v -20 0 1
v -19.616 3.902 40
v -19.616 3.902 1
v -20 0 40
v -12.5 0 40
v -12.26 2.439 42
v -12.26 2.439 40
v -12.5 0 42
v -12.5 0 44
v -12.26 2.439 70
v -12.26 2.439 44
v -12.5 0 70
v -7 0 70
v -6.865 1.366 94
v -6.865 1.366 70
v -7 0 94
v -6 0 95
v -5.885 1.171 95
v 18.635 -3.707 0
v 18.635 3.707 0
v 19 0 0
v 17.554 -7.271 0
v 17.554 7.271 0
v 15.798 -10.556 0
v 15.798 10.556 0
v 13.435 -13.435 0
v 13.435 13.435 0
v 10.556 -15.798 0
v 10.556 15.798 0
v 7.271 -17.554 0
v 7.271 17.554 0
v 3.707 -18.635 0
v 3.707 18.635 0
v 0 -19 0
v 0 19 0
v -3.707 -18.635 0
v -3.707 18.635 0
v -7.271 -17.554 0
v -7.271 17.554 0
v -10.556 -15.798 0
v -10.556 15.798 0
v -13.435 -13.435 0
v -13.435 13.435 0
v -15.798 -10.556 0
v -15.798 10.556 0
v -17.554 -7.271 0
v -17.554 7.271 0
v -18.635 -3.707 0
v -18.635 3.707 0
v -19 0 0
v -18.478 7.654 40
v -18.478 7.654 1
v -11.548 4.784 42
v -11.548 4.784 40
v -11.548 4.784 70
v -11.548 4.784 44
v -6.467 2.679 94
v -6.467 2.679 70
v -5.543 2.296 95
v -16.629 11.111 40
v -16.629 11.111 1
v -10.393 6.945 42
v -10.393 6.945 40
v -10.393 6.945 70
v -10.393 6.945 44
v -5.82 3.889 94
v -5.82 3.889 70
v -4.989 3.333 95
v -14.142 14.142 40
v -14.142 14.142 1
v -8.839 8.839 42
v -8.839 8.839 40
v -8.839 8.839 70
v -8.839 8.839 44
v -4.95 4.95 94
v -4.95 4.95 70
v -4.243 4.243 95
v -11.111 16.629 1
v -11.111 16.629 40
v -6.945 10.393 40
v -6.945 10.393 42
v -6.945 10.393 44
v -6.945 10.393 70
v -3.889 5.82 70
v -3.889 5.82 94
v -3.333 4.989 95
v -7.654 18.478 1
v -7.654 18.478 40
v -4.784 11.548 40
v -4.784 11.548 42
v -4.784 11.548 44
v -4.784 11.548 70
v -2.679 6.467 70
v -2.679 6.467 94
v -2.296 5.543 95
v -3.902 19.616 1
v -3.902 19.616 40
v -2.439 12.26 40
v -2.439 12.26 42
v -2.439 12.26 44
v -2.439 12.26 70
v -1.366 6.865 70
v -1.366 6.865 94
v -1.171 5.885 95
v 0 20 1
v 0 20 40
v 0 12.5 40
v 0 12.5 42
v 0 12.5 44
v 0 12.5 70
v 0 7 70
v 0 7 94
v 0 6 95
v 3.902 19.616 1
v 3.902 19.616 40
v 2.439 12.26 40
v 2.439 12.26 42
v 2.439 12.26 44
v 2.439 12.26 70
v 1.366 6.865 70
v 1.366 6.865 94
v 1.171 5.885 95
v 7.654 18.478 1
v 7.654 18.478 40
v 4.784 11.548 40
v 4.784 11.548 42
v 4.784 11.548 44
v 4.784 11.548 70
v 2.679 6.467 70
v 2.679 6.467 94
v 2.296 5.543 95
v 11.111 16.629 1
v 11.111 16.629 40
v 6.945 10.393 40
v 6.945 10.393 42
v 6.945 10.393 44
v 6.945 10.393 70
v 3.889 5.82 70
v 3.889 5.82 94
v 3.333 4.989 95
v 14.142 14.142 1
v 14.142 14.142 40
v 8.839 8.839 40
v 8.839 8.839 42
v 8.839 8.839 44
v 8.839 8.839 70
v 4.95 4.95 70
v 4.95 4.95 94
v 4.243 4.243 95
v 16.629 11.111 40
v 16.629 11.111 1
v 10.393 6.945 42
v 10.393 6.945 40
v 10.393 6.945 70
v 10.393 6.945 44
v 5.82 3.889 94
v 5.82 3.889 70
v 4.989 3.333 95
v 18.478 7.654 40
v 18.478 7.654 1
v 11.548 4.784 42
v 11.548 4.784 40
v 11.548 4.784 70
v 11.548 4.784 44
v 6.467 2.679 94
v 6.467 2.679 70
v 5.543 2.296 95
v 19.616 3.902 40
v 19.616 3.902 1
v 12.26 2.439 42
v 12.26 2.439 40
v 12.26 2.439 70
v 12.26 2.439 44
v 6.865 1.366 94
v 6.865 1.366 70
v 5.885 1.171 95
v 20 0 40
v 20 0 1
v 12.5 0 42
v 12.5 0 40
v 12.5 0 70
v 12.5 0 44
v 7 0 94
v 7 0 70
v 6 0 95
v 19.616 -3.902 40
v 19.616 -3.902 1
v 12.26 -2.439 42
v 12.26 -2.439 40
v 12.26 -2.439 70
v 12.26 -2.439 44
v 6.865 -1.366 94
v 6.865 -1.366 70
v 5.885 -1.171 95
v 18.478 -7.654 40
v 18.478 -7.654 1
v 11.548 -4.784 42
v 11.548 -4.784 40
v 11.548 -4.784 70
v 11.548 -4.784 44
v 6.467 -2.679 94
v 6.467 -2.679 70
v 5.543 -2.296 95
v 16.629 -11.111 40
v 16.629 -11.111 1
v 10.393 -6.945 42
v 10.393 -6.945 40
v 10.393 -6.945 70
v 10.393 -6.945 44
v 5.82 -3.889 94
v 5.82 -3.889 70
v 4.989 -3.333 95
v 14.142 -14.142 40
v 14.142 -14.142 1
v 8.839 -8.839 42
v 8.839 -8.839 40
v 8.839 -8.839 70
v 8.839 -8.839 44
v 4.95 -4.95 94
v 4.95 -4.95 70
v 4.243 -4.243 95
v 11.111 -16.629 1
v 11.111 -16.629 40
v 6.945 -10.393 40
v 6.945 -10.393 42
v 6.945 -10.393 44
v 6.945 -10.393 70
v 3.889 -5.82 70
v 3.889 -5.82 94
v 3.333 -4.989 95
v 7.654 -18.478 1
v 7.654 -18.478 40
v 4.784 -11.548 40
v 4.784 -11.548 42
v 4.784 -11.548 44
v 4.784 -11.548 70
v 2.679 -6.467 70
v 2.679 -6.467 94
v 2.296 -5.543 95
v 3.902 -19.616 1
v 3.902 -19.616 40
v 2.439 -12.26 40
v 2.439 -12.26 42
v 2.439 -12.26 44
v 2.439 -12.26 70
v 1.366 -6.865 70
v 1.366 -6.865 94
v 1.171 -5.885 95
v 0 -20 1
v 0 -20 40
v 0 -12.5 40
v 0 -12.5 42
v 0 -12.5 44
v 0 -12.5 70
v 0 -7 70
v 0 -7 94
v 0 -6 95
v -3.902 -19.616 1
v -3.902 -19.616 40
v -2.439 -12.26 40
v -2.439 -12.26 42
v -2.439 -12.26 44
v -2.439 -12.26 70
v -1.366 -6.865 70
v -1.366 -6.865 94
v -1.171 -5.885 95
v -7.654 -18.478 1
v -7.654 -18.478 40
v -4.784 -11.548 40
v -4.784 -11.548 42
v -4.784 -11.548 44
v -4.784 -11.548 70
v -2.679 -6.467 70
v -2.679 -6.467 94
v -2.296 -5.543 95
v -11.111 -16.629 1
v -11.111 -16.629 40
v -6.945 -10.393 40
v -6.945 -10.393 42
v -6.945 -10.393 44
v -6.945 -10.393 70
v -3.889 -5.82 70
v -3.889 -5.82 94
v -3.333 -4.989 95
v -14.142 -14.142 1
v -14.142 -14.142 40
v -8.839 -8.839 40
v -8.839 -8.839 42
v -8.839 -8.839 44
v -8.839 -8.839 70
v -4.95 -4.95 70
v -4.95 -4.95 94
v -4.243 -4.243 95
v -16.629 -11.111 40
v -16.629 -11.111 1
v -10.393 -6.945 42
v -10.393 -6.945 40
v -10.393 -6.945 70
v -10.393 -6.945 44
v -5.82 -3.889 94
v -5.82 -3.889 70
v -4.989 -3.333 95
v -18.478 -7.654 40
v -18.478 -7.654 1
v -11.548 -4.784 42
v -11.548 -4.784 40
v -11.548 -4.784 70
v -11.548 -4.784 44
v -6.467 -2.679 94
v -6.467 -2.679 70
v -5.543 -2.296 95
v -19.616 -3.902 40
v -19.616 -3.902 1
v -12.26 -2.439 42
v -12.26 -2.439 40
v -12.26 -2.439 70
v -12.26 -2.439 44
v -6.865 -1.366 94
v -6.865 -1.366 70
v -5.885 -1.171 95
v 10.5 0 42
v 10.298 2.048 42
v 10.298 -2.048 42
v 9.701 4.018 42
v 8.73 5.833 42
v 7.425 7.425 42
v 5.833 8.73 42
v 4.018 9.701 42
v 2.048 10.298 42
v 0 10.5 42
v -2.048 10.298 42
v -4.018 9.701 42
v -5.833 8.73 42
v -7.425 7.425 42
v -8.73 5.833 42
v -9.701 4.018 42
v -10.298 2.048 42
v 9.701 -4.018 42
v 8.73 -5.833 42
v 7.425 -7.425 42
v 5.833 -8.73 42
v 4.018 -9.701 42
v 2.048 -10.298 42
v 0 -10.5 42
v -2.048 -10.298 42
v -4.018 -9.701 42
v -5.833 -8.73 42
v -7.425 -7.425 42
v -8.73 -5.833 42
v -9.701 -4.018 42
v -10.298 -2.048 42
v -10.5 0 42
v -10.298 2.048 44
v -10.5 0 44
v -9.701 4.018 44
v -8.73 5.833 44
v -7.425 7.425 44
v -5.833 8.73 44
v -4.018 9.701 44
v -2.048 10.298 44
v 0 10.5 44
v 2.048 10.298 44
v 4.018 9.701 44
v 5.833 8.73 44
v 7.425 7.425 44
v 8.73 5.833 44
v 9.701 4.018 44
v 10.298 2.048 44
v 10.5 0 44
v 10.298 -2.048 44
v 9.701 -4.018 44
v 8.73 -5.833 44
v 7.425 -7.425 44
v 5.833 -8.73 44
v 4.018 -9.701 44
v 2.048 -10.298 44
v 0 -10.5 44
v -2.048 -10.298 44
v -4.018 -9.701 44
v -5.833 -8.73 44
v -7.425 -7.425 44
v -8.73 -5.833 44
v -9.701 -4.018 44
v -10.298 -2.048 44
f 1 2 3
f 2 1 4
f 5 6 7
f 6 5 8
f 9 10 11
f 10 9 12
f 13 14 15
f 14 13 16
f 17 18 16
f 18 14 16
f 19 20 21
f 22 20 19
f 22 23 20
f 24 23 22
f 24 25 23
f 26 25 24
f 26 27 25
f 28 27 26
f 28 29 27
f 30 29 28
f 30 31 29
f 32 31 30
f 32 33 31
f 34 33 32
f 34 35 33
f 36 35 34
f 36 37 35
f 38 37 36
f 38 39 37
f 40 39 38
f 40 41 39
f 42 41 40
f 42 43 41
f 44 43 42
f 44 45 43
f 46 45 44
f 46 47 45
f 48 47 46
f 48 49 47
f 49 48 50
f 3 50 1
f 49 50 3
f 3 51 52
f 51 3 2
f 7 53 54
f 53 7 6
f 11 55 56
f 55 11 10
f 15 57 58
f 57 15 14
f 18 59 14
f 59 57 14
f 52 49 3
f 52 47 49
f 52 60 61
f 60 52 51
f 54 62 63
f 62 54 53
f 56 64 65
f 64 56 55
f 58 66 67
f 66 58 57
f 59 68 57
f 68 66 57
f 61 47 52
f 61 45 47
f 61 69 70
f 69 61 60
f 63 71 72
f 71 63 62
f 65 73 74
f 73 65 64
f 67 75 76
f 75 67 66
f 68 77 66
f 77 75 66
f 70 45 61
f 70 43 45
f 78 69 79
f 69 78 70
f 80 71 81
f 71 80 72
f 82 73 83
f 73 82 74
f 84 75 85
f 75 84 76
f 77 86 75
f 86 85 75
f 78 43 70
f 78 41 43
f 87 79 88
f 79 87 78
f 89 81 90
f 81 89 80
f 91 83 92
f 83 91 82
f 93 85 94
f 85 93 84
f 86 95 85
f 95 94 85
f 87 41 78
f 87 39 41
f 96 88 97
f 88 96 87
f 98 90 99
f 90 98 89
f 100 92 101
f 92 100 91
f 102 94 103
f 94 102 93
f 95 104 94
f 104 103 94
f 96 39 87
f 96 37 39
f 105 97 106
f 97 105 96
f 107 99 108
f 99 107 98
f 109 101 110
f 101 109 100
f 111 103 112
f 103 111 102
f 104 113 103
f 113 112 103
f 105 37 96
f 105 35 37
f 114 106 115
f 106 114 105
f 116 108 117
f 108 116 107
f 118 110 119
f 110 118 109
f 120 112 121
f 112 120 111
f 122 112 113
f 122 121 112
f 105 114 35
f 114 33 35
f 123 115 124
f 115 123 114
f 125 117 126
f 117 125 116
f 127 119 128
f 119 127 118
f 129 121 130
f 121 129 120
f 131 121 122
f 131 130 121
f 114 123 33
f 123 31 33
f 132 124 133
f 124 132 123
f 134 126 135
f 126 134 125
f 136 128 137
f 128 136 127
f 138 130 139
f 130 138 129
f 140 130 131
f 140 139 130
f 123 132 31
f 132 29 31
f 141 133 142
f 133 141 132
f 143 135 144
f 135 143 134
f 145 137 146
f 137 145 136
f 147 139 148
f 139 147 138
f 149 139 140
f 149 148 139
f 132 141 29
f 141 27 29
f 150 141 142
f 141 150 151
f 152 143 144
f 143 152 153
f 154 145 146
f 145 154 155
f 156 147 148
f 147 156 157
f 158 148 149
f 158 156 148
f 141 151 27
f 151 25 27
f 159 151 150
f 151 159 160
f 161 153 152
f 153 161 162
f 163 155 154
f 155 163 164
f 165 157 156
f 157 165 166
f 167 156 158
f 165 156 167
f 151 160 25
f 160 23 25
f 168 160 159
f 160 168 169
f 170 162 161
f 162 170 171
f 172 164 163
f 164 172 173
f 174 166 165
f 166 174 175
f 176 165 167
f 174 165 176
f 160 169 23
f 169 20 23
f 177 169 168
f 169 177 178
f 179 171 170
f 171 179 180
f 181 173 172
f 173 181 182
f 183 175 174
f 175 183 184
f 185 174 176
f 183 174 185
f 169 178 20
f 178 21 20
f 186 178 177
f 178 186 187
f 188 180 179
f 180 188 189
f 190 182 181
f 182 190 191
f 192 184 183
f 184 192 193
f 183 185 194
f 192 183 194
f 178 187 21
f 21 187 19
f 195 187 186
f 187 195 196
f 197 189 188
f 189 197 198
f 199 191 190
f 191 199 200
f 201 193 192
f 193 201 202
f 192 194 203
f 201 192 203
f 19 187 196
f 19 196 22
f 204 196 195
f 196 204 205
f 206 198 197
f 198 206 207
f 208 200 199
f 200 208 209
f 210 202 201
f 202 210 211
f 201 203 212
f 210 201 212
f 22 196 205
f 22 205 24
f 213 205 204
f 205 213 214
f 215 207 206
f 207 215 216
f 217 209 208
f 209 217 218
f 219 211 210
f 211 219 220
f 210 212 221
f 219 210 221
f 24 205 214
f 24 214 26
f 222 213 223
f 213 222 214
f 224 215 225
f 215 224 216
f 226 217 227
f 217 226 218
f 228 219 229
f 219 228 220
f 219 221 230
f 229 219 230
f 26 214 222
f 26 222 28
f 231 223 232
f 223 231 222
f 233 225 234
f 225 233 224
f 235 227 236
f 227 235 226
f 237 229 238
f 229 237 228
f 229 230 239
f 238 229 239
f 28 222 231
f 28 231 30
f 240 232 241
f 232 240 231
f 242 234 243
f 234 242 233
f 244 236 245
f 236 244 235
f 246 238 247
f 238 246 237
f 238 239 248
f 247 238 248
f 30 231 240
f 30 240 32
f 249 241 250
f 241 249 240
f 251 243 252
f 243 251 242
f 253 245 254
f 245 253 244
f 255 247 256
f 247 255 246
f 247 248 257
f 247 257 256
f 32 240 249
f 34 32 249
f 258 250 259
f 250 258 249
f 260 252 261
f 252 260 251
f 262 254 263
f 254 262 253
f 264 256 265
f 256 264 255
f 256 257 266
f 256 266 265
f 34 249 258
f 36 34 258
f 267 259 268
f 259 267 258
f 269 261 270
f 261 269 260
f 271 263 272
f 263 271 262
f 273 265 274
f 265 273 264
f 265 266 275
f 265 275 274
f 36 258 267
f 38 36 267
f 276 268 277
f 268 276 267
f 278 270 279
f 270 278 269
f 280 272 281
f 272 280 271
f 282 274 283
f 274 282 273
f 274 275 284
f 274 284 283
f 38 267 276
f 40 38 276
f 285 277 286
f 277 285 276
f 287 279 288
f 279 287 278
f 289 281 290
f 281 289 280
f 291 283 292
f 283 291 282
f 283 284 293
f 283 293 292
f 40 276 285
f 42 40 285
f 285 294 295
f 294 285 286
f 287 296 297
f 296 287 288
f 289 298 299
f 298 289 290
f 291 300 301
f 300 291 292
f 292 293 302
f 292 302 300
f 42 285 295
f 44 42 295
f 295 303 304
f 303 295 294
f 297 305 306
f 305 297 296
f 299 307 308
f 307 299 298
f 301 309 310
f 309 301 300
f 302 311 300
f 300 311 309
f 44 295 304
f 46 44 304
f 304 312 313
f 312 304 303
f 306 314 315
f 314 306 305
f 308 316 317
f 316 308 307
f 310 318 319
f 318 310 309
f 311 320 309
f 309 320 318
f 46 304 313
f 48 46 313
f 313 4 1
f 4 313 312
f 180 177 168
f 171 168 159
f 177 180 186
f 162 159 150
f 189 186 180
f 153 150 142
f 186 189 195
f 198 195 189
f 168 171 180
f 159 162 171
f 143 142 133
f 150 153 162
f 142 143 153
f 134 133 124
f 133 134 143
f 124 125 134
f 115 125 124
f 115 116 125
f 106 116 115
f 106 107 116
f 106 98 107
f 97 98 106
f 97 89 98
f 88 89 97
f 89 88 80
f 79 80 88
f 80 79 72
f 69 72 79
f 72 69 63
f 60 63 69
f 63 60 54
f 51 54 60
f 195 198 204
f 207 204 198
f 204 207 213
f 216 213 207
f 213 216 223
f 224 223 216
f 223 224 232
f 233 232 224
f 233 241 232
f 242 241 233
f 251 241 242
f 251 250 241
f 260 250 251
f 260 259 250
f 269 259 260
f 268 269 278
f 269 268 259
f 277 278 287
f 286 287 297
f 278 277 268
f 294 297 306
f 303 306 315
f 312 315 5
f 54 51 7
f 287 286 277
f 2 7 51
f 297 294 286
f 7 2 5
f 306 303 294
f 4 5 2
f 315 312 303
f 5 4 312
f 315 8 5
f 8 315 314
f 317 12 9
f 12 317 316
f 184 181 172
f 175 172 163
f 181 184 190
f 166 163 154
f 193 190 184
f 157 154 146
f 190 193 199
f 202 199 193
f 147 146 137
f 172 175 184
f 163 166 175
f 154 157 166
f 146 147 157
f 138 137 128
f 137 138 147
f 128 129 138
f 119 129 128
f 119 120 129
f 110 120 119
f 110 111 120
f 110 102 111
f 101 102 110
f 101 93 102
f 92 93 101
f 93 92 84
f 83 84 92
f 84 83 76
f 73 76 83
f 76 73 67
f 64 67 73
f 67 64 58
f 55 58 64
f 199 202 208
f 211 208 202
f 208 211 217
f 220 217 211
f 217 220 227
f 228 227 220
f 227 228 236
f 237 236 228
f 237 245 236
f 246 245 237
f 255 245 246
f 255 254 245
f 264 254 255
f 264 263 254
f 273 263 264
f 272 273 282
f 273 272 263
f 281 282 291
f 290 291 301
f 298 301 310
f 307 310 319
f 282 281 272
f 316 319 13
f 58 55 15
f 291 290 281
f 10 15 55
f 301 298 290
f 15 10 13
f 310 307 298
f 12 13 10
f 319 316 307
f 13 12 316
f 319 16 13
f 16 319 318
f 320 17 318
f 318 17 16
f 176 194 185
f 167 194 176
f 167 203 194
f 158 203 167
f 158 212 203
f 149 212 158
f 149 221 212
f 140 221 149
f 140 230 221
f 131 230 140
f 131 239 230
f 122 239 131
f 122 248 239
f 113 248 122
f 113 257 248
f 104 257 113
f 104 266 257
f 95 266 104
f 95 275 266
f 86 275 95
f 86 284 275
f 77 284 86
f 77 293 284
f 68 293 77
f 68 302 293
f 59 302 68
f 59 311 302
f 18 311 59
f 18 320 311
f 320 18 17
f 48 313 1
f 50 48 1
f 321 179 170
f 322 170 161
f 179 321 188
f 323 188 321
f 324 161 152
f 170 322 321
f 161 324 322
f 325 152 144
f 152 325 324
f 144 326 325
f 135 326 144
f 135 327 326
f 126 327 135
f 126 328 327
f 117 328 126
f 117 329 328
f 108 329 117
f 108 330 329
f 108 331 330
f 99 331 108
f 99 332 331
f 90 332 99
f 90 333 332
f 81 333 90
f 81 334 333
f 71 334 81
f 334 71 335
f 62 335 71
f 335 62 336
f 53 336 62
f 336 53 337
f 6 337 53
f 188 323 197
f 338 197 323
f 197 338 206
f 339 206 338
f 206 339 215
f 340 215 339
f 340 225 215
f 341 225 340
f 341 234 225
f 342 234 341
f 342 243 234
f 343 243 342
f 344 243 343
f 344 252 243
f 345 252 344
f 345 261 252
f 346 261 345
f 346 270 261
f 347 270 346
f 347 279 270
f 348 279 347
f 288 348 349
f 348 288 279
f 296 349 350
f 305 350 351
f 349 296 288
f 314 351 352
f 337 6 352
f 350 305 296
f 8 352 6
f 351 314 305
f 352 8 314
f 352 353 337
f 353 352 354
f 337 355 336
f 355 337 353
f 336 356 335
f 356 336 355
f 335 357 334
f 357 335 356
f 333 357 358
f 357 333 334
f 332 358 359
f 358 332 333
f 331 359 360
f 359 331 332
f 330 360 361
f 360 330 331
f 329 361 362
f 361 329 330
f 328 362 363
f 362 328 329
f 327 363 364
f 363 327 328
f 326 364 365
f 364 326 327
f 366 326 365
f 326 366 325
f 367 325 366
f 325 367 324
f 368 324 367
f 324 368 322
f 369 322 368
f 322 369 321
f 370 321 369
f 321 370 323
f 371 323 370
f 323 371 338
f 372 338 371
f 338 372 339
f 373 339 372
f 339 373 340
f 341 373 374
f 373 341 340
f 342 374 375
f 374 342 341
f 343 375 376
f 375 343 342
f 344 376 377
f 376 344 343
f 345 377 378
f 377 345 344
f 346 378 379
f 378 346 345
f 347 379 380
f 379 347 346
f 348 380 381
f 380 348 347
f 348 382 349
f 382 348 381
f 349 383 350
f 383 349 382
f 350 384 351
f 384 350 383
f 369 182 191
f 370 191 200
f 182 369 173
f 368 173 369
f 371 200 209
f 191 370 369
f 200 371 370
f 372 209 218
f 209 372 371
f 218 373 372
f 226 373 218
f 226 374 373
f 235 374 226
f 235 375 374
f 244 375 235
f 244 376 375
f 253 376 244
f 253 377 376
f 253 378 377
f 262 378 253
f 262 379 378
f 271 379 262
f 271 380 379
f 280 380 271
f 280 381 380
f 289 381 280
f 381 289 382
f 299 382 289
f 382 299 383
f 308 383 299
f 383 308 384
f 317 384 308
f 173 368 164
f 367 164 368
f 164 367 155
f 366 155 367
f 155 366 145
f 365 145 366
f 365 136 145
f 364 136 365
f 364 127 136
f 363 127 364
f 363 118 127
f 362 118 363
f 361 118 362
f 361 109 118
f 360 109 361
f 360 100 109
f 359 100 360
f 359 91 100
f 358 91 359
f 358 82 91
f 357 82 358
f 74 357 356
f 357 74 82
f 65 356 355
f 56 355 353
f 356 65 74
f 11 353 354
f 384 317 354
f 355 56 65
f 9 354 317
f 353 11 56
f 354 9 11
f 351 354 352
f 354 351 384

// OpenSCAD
$fn = 32;

// ----------------------------------------------------------------------
// Stepped shaft: diameters 40, 25, 14 mm, 95 mm long
// ----------------------------------------------------------------------

// --- parameters (mm) ---
d1 = 40;                  // step 1 diameter
len1 = 40;                // step 1 length
d2 = 25;                  // step 2 diameter
len2 = 30;                // step 2 length
d3 = 14;                  // step 3 diameter
len3 = 25;                // step 3 length
total = 95;               // overall length
chamfer = 1;              // end chamfer
groove_r = 12.5;          // groove radius
groove_z = 42;            // groove position from the end
groove_w = 2;             // groove width
groove_d = 2;             // groove depth
key_w = 5;                // keyway width
key_d = 2.5;              // keyway depth
key_len = 34;             // keyway length
key_z = 58;               // keyway start along the shaft

/* closed turning profile: x is the radius, y is the length */
profile = [[0, 0], [20 - chamfer, 0], [20, chamfer], [20, 40], [12.5, 40], [12.5, 70], [7, 70], [7, 94], [6, 95], [0, 95]];

difference() {
  rotate_extrude() polygon(profile);
  /* circlip groove just behind the shoulder */
  rotate_extrude() translate([groove_r - groove_d, groove_z]) square([groove_d + 1, groove_w]);
  /* keyway milled into the top of the largest step */
  translate([d1 / 2 - key_d, -key_w / 2, key_z]) cube([key_d + 1, key_w, key_len]);
}
